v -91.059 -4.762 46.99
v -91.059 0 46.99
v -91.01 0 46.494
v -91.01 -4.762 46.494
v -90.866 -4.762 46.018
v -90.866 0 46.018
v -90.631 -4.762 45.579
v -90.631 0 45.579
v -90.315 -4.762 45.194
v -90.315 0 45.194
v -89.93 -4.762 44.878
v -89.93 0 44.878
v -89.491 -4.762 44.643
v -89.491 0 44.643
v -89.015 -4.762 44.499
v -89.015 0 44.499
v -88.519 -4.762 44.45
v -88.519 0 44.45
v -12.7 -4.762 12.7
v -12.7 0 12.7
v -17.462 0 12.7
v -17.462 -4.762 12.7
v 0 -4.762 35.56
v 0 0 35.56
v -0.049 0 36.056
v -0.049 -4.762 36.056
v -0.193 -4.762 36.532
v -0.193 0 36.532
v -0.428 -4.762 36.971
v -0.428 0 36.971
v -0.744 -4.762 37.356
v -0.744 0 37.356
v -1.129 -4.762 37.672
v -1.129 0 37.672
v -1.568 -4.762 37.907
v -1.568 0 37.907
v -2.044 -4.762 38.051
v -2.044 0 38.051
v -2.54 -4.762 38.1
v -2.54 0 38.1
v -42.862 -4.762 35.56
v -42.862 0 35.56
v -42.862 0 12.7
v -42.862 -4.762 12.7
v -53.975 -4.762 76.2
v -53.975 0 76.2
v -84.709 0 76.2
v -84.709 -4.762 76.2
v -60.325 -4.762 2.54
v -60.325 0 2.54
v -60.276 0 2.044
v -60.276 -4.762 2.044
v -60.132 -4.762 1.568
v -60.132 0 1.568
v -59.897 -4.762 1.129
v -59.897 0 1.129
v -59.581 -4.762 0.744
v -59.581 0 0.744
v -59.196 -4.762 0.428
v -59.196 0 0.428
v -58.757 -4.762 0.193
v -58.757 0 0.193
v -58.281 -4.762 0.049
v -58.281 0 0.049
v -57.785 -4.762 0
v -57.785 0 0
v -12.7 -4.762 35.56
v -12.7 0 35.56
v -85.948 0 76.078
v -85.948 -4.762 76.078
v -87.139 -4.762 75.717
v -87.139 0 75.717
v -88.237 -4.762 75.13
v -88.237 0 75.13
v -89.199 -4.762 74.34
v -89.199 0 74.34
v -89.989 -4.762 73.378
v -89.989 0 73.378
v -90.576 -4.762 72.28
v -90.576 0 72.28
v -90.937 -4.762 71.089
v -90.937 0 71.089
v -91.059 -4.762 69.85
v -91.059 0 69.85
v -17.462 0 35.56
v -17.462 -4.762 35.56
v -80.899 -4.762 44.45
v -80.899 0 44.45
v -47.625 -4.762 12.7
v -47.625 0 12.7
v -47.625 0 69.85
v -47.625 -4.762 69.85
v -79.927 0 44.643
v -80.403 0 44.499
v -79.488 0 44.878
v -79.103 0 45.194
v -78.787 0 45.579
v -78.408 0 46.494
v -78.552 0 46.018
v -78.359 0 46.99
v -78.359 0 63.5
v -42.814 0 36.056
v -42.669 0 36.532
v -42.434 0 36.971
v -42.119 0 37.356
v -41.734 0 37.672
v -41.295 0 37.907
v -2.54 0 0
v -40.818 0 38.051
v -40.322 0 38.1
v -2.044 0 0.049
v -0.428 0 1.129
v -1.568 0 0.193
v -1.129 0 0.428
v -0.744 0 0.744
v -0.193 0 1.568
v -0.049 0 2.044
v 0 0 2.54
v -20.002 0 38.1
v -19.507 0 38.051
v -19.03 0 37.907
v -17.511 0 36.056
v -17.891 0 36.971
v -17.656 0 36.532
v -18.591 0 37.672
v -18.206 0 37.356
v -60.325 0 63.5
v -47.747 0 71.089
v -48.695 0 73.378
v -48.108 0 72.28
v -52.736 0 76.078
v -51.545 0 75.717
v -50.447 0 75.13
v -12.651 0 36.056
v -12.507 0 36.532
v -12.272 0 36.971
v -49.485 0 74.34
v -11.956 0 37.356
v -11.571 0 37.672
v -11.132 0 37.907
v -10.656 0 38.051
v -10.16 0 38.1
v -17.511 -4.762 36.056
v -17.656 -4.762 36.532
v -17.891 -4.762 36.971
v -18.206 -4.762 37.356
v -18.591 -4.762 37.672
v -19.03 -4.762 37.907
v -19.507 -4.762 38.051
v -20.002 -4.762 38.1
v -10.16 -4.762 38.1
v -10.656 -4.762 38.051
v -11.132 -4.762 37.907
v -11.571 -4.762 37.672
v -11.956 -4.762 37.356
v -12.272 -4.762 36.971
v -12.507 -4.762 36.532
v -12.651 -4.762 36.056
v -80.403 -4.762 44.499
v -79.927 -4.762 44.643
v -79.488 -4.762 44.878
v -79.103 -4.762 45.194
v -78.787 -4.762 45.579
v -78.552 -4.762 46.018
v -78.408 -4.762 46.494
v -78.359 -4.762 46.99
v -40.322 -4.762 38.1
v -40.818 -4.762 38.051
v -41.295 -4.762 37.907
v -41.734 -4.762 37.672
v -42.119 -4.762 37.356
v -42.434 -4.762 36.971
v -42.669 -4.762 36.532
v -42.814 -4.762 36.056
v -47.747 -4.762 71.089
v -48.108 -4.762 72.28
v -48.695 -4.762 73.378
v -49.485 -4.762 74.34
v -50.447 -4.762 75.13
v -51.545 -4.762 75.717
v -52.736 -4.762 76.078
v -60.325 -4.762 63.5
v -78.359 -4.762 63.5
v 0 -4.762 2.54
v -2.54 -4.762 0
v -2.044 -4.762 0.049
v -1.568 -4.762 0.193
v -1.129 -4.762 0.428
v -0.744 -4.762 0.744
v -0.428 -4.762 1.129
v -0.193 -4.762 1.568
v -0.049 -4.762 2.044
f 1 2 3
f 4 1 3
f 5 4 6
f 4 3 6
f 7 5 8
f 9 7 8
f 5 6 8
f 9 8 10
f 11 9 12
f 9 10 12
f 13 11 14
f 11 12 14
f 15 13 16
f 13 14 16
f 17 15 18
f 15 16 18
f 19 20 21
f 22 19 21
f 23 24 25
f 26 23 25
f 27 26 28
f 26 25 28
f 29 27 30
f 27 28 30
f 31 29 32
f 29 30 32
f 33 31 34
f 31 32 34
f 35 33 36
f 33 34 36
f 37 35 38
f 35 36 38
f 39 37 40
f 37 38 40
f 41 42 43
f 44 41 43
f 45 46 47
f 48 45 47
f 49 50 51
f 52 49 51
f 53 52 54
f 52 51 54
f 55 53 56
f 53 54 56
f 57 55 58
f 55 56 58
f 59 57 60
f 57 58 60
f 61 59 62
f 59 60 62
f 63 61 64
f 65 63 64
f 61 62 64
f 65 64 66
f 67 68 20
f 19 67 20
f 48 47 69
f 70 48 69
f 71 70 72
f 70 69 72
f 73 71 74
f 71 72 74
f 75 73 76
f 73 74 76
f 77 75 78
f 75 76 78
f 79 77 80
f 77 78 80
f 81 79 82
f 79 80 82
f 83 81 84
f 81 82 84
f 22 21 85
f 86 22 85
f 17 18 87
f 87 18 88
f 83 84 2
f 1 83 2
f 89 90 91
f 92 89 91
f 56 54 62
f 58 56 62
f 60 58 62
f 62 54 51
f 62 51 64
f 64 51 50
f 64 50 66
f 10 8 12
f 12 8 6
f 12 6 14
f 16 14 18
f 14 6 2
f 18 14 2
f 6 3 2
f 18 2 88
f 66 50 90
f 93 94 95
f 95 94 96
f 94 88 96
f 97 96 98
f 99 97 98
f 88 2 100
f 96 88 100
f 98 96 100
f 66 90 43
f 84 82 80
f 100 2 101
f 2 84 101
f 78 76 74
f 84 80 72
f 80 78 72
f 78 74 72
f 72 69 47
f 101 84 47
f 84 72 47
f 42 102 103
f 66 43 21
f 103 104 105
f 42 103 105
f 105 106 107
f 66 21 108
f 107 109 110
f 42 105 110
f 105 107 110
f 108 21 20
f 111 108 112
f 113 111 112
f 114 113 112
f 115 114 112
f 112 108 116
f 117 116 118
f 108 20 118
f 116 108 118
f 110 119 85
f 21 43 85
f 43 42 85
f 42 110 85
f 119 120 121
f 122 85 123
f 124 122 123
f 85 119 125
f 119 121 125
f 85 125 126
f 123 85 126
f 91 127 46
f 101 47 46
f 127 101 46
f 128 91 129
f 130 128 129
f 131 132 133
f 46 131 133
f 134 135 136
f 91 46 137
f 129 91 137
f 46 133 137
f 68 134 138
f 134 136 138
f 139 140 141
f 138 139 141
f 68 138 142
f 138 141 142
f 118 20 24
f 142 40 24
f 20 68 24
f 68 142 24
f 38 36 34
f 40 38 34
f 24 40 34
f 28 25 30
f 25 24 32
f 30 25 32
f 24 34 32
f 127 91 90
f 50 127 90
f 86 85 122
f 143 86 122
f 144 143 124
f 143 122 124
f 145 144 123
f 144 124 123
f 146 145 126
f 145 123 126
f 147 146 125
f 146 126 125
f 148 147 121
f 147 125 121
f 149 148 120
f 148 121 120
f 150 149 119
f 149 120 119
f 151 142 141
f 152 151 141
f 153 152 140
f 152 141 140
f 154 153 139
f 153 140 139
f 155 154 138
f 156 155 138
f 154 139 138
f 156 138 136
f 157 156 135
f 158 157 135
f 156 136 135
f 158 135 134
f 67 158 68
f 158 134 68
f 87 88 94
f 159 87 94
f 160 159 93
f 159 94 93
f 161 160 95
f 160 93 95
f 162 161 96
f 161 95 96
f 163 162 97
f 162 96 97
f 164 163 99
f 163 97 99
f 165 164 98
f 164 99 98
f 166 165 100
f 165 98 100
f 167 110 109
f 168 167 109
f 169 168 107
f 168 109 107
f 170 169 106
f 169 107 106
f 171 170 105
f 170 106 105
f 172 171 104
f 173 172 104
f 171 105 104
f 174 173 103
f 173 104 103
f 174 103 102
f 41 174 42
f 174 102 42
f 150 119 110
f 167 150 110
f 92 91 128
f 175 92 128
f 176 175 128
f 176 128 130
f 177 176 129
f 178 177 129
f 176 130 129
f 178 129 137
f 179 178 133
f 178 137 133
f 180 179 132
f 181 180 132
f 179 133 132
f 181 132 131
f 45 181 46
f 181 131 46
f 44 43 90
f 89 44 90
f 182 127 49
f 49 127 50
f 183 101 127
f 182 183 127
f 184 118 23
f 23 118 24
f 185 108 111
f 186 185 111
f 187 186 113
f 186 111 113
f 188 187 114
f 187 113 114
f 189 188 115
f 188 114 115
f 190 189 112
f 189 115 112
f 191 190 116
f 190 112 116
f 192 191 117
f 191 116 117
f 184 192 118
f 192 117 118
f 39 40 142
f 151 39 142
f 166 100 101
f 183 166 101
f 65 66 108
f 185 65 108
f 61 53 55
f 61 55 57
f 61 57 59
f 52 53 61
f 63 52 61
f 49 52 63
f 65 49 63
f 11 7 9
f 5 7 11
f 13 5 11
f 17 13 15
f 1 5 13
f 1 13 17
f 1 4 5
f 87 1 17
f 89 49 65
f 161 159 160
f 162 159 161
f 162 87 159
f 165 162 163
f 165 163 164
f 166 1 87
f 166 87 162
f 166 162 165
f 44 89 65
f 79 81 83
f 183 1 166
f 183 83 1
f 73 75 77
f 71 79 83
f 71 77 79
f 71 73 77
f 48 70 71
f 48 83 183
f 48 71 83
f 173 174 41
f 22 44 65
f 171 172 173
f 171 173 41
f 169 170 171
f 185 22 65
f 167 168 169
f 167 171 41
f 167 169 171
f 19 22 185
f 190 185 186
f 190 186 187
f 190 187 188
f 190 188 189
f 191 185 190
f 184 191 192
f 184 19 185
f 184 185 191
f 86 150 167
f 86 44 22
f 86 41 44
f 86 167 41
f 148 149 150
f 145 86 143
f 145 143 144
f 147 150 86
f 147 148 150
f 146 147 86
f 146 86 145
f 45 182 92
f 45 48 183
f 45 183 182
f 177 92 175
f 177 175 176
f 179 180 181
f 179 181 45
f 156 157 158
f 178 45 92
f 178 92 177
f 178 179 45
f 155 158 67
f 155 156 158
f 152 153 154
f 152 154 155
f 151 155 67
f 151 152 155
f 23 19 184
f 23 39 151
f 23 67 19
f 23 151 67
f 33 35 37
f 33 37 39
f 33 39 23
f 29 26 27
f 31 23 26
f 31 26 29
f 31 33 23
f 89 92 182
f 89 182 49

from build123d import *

# Parameters (mm, degrees)
F1_DEPTH = 4.7625


with BuildPart() as f1:
    # F0 (on Front) → F1 (new body)
    with BuildSketch(Plane.XZ):
        with BuildLine():
            Line((-57.785, 0), (-2.54, 0))
            ThreePointArc((-2.54, 0), (-0.743949, 0.743949), (0, 2.54))
            Line((0, 2.54), (0, 35.56))
            ThreePointArc((0, 35.56), (-0.743949, 37.356051), (-2.54, 38.1))
            Line((-2.54, 38.1), (-10.16, 38.1))
            ThreePointArc((-10.16, 38.1), (-11.956051, 37.356051), (-12.7, 35.56))
            Line((-12.7, 35.56), (-12.7, 12.7))
            Line((-12.7, 12.7), (-17.4625, 12.7))
            Line((-17.4625, 12.7), (-17.4625, 35.56))
            ThreePointArc((-17.4625, 35.56), (-18.206449, 37.356051), (-20.0025, 38.1))
            Line((-20.0025, 38.1), (-40.3225, 38.1))
            ThreePointArc((-40.3225, 38.1), (-42.118551, 37.356051), (-42.8625, 35.56))
            Line((-42.8625, 35.56), (-42.8625, 12.7))
            Line((-42.8625, 12.7), (-47.625, 12.7))
            Line((-47.625, 12.7), (-47.625, 63.5))
            Line((-47.625, 63.5), (-47.625, 69.85))
            ThreePointArc((-47.625, 69.85), (-49.484872, 74.340128), (-53.975, 76.2))
            Line((-53.975, 76.2), (-78.359, 76.2))
            Line((-78.359, 76.2), (-84.709, 76.2))
            ThreePointArc((-84.709, 76.2), (-89.199128, 74.340128), (-91.059, 69.85))
            Line((-91.059, 69.85), (-91.059, 63.5))
            Line((-91.059, 63.5), (-91.059, 46.99))
            ThreePointArc((-91.059, 46.99), (-90.315051, 45.193949), (-88.519, 44.45))
            Line((-88.519, 44.45), (-80.899, 44.45))
            ThreePointArc((-80.899, 44.45), (-79.102949, 45.193949), (-78.359, 46.99))
            Line((-78.359, 46.99), (-78.359, 63.5))
            Line((-78.359, 63.5), (-60.325, 63.5))
            Line((-60.325, 63.5), (-60.325, 2.54))
            ThreePointArc((-60.325, 2.54), (-59.581051, 0.743949), (-57.785, 0))
        make_face()
    extrude(amount=F1_DEPTH)


solid = f1.part
